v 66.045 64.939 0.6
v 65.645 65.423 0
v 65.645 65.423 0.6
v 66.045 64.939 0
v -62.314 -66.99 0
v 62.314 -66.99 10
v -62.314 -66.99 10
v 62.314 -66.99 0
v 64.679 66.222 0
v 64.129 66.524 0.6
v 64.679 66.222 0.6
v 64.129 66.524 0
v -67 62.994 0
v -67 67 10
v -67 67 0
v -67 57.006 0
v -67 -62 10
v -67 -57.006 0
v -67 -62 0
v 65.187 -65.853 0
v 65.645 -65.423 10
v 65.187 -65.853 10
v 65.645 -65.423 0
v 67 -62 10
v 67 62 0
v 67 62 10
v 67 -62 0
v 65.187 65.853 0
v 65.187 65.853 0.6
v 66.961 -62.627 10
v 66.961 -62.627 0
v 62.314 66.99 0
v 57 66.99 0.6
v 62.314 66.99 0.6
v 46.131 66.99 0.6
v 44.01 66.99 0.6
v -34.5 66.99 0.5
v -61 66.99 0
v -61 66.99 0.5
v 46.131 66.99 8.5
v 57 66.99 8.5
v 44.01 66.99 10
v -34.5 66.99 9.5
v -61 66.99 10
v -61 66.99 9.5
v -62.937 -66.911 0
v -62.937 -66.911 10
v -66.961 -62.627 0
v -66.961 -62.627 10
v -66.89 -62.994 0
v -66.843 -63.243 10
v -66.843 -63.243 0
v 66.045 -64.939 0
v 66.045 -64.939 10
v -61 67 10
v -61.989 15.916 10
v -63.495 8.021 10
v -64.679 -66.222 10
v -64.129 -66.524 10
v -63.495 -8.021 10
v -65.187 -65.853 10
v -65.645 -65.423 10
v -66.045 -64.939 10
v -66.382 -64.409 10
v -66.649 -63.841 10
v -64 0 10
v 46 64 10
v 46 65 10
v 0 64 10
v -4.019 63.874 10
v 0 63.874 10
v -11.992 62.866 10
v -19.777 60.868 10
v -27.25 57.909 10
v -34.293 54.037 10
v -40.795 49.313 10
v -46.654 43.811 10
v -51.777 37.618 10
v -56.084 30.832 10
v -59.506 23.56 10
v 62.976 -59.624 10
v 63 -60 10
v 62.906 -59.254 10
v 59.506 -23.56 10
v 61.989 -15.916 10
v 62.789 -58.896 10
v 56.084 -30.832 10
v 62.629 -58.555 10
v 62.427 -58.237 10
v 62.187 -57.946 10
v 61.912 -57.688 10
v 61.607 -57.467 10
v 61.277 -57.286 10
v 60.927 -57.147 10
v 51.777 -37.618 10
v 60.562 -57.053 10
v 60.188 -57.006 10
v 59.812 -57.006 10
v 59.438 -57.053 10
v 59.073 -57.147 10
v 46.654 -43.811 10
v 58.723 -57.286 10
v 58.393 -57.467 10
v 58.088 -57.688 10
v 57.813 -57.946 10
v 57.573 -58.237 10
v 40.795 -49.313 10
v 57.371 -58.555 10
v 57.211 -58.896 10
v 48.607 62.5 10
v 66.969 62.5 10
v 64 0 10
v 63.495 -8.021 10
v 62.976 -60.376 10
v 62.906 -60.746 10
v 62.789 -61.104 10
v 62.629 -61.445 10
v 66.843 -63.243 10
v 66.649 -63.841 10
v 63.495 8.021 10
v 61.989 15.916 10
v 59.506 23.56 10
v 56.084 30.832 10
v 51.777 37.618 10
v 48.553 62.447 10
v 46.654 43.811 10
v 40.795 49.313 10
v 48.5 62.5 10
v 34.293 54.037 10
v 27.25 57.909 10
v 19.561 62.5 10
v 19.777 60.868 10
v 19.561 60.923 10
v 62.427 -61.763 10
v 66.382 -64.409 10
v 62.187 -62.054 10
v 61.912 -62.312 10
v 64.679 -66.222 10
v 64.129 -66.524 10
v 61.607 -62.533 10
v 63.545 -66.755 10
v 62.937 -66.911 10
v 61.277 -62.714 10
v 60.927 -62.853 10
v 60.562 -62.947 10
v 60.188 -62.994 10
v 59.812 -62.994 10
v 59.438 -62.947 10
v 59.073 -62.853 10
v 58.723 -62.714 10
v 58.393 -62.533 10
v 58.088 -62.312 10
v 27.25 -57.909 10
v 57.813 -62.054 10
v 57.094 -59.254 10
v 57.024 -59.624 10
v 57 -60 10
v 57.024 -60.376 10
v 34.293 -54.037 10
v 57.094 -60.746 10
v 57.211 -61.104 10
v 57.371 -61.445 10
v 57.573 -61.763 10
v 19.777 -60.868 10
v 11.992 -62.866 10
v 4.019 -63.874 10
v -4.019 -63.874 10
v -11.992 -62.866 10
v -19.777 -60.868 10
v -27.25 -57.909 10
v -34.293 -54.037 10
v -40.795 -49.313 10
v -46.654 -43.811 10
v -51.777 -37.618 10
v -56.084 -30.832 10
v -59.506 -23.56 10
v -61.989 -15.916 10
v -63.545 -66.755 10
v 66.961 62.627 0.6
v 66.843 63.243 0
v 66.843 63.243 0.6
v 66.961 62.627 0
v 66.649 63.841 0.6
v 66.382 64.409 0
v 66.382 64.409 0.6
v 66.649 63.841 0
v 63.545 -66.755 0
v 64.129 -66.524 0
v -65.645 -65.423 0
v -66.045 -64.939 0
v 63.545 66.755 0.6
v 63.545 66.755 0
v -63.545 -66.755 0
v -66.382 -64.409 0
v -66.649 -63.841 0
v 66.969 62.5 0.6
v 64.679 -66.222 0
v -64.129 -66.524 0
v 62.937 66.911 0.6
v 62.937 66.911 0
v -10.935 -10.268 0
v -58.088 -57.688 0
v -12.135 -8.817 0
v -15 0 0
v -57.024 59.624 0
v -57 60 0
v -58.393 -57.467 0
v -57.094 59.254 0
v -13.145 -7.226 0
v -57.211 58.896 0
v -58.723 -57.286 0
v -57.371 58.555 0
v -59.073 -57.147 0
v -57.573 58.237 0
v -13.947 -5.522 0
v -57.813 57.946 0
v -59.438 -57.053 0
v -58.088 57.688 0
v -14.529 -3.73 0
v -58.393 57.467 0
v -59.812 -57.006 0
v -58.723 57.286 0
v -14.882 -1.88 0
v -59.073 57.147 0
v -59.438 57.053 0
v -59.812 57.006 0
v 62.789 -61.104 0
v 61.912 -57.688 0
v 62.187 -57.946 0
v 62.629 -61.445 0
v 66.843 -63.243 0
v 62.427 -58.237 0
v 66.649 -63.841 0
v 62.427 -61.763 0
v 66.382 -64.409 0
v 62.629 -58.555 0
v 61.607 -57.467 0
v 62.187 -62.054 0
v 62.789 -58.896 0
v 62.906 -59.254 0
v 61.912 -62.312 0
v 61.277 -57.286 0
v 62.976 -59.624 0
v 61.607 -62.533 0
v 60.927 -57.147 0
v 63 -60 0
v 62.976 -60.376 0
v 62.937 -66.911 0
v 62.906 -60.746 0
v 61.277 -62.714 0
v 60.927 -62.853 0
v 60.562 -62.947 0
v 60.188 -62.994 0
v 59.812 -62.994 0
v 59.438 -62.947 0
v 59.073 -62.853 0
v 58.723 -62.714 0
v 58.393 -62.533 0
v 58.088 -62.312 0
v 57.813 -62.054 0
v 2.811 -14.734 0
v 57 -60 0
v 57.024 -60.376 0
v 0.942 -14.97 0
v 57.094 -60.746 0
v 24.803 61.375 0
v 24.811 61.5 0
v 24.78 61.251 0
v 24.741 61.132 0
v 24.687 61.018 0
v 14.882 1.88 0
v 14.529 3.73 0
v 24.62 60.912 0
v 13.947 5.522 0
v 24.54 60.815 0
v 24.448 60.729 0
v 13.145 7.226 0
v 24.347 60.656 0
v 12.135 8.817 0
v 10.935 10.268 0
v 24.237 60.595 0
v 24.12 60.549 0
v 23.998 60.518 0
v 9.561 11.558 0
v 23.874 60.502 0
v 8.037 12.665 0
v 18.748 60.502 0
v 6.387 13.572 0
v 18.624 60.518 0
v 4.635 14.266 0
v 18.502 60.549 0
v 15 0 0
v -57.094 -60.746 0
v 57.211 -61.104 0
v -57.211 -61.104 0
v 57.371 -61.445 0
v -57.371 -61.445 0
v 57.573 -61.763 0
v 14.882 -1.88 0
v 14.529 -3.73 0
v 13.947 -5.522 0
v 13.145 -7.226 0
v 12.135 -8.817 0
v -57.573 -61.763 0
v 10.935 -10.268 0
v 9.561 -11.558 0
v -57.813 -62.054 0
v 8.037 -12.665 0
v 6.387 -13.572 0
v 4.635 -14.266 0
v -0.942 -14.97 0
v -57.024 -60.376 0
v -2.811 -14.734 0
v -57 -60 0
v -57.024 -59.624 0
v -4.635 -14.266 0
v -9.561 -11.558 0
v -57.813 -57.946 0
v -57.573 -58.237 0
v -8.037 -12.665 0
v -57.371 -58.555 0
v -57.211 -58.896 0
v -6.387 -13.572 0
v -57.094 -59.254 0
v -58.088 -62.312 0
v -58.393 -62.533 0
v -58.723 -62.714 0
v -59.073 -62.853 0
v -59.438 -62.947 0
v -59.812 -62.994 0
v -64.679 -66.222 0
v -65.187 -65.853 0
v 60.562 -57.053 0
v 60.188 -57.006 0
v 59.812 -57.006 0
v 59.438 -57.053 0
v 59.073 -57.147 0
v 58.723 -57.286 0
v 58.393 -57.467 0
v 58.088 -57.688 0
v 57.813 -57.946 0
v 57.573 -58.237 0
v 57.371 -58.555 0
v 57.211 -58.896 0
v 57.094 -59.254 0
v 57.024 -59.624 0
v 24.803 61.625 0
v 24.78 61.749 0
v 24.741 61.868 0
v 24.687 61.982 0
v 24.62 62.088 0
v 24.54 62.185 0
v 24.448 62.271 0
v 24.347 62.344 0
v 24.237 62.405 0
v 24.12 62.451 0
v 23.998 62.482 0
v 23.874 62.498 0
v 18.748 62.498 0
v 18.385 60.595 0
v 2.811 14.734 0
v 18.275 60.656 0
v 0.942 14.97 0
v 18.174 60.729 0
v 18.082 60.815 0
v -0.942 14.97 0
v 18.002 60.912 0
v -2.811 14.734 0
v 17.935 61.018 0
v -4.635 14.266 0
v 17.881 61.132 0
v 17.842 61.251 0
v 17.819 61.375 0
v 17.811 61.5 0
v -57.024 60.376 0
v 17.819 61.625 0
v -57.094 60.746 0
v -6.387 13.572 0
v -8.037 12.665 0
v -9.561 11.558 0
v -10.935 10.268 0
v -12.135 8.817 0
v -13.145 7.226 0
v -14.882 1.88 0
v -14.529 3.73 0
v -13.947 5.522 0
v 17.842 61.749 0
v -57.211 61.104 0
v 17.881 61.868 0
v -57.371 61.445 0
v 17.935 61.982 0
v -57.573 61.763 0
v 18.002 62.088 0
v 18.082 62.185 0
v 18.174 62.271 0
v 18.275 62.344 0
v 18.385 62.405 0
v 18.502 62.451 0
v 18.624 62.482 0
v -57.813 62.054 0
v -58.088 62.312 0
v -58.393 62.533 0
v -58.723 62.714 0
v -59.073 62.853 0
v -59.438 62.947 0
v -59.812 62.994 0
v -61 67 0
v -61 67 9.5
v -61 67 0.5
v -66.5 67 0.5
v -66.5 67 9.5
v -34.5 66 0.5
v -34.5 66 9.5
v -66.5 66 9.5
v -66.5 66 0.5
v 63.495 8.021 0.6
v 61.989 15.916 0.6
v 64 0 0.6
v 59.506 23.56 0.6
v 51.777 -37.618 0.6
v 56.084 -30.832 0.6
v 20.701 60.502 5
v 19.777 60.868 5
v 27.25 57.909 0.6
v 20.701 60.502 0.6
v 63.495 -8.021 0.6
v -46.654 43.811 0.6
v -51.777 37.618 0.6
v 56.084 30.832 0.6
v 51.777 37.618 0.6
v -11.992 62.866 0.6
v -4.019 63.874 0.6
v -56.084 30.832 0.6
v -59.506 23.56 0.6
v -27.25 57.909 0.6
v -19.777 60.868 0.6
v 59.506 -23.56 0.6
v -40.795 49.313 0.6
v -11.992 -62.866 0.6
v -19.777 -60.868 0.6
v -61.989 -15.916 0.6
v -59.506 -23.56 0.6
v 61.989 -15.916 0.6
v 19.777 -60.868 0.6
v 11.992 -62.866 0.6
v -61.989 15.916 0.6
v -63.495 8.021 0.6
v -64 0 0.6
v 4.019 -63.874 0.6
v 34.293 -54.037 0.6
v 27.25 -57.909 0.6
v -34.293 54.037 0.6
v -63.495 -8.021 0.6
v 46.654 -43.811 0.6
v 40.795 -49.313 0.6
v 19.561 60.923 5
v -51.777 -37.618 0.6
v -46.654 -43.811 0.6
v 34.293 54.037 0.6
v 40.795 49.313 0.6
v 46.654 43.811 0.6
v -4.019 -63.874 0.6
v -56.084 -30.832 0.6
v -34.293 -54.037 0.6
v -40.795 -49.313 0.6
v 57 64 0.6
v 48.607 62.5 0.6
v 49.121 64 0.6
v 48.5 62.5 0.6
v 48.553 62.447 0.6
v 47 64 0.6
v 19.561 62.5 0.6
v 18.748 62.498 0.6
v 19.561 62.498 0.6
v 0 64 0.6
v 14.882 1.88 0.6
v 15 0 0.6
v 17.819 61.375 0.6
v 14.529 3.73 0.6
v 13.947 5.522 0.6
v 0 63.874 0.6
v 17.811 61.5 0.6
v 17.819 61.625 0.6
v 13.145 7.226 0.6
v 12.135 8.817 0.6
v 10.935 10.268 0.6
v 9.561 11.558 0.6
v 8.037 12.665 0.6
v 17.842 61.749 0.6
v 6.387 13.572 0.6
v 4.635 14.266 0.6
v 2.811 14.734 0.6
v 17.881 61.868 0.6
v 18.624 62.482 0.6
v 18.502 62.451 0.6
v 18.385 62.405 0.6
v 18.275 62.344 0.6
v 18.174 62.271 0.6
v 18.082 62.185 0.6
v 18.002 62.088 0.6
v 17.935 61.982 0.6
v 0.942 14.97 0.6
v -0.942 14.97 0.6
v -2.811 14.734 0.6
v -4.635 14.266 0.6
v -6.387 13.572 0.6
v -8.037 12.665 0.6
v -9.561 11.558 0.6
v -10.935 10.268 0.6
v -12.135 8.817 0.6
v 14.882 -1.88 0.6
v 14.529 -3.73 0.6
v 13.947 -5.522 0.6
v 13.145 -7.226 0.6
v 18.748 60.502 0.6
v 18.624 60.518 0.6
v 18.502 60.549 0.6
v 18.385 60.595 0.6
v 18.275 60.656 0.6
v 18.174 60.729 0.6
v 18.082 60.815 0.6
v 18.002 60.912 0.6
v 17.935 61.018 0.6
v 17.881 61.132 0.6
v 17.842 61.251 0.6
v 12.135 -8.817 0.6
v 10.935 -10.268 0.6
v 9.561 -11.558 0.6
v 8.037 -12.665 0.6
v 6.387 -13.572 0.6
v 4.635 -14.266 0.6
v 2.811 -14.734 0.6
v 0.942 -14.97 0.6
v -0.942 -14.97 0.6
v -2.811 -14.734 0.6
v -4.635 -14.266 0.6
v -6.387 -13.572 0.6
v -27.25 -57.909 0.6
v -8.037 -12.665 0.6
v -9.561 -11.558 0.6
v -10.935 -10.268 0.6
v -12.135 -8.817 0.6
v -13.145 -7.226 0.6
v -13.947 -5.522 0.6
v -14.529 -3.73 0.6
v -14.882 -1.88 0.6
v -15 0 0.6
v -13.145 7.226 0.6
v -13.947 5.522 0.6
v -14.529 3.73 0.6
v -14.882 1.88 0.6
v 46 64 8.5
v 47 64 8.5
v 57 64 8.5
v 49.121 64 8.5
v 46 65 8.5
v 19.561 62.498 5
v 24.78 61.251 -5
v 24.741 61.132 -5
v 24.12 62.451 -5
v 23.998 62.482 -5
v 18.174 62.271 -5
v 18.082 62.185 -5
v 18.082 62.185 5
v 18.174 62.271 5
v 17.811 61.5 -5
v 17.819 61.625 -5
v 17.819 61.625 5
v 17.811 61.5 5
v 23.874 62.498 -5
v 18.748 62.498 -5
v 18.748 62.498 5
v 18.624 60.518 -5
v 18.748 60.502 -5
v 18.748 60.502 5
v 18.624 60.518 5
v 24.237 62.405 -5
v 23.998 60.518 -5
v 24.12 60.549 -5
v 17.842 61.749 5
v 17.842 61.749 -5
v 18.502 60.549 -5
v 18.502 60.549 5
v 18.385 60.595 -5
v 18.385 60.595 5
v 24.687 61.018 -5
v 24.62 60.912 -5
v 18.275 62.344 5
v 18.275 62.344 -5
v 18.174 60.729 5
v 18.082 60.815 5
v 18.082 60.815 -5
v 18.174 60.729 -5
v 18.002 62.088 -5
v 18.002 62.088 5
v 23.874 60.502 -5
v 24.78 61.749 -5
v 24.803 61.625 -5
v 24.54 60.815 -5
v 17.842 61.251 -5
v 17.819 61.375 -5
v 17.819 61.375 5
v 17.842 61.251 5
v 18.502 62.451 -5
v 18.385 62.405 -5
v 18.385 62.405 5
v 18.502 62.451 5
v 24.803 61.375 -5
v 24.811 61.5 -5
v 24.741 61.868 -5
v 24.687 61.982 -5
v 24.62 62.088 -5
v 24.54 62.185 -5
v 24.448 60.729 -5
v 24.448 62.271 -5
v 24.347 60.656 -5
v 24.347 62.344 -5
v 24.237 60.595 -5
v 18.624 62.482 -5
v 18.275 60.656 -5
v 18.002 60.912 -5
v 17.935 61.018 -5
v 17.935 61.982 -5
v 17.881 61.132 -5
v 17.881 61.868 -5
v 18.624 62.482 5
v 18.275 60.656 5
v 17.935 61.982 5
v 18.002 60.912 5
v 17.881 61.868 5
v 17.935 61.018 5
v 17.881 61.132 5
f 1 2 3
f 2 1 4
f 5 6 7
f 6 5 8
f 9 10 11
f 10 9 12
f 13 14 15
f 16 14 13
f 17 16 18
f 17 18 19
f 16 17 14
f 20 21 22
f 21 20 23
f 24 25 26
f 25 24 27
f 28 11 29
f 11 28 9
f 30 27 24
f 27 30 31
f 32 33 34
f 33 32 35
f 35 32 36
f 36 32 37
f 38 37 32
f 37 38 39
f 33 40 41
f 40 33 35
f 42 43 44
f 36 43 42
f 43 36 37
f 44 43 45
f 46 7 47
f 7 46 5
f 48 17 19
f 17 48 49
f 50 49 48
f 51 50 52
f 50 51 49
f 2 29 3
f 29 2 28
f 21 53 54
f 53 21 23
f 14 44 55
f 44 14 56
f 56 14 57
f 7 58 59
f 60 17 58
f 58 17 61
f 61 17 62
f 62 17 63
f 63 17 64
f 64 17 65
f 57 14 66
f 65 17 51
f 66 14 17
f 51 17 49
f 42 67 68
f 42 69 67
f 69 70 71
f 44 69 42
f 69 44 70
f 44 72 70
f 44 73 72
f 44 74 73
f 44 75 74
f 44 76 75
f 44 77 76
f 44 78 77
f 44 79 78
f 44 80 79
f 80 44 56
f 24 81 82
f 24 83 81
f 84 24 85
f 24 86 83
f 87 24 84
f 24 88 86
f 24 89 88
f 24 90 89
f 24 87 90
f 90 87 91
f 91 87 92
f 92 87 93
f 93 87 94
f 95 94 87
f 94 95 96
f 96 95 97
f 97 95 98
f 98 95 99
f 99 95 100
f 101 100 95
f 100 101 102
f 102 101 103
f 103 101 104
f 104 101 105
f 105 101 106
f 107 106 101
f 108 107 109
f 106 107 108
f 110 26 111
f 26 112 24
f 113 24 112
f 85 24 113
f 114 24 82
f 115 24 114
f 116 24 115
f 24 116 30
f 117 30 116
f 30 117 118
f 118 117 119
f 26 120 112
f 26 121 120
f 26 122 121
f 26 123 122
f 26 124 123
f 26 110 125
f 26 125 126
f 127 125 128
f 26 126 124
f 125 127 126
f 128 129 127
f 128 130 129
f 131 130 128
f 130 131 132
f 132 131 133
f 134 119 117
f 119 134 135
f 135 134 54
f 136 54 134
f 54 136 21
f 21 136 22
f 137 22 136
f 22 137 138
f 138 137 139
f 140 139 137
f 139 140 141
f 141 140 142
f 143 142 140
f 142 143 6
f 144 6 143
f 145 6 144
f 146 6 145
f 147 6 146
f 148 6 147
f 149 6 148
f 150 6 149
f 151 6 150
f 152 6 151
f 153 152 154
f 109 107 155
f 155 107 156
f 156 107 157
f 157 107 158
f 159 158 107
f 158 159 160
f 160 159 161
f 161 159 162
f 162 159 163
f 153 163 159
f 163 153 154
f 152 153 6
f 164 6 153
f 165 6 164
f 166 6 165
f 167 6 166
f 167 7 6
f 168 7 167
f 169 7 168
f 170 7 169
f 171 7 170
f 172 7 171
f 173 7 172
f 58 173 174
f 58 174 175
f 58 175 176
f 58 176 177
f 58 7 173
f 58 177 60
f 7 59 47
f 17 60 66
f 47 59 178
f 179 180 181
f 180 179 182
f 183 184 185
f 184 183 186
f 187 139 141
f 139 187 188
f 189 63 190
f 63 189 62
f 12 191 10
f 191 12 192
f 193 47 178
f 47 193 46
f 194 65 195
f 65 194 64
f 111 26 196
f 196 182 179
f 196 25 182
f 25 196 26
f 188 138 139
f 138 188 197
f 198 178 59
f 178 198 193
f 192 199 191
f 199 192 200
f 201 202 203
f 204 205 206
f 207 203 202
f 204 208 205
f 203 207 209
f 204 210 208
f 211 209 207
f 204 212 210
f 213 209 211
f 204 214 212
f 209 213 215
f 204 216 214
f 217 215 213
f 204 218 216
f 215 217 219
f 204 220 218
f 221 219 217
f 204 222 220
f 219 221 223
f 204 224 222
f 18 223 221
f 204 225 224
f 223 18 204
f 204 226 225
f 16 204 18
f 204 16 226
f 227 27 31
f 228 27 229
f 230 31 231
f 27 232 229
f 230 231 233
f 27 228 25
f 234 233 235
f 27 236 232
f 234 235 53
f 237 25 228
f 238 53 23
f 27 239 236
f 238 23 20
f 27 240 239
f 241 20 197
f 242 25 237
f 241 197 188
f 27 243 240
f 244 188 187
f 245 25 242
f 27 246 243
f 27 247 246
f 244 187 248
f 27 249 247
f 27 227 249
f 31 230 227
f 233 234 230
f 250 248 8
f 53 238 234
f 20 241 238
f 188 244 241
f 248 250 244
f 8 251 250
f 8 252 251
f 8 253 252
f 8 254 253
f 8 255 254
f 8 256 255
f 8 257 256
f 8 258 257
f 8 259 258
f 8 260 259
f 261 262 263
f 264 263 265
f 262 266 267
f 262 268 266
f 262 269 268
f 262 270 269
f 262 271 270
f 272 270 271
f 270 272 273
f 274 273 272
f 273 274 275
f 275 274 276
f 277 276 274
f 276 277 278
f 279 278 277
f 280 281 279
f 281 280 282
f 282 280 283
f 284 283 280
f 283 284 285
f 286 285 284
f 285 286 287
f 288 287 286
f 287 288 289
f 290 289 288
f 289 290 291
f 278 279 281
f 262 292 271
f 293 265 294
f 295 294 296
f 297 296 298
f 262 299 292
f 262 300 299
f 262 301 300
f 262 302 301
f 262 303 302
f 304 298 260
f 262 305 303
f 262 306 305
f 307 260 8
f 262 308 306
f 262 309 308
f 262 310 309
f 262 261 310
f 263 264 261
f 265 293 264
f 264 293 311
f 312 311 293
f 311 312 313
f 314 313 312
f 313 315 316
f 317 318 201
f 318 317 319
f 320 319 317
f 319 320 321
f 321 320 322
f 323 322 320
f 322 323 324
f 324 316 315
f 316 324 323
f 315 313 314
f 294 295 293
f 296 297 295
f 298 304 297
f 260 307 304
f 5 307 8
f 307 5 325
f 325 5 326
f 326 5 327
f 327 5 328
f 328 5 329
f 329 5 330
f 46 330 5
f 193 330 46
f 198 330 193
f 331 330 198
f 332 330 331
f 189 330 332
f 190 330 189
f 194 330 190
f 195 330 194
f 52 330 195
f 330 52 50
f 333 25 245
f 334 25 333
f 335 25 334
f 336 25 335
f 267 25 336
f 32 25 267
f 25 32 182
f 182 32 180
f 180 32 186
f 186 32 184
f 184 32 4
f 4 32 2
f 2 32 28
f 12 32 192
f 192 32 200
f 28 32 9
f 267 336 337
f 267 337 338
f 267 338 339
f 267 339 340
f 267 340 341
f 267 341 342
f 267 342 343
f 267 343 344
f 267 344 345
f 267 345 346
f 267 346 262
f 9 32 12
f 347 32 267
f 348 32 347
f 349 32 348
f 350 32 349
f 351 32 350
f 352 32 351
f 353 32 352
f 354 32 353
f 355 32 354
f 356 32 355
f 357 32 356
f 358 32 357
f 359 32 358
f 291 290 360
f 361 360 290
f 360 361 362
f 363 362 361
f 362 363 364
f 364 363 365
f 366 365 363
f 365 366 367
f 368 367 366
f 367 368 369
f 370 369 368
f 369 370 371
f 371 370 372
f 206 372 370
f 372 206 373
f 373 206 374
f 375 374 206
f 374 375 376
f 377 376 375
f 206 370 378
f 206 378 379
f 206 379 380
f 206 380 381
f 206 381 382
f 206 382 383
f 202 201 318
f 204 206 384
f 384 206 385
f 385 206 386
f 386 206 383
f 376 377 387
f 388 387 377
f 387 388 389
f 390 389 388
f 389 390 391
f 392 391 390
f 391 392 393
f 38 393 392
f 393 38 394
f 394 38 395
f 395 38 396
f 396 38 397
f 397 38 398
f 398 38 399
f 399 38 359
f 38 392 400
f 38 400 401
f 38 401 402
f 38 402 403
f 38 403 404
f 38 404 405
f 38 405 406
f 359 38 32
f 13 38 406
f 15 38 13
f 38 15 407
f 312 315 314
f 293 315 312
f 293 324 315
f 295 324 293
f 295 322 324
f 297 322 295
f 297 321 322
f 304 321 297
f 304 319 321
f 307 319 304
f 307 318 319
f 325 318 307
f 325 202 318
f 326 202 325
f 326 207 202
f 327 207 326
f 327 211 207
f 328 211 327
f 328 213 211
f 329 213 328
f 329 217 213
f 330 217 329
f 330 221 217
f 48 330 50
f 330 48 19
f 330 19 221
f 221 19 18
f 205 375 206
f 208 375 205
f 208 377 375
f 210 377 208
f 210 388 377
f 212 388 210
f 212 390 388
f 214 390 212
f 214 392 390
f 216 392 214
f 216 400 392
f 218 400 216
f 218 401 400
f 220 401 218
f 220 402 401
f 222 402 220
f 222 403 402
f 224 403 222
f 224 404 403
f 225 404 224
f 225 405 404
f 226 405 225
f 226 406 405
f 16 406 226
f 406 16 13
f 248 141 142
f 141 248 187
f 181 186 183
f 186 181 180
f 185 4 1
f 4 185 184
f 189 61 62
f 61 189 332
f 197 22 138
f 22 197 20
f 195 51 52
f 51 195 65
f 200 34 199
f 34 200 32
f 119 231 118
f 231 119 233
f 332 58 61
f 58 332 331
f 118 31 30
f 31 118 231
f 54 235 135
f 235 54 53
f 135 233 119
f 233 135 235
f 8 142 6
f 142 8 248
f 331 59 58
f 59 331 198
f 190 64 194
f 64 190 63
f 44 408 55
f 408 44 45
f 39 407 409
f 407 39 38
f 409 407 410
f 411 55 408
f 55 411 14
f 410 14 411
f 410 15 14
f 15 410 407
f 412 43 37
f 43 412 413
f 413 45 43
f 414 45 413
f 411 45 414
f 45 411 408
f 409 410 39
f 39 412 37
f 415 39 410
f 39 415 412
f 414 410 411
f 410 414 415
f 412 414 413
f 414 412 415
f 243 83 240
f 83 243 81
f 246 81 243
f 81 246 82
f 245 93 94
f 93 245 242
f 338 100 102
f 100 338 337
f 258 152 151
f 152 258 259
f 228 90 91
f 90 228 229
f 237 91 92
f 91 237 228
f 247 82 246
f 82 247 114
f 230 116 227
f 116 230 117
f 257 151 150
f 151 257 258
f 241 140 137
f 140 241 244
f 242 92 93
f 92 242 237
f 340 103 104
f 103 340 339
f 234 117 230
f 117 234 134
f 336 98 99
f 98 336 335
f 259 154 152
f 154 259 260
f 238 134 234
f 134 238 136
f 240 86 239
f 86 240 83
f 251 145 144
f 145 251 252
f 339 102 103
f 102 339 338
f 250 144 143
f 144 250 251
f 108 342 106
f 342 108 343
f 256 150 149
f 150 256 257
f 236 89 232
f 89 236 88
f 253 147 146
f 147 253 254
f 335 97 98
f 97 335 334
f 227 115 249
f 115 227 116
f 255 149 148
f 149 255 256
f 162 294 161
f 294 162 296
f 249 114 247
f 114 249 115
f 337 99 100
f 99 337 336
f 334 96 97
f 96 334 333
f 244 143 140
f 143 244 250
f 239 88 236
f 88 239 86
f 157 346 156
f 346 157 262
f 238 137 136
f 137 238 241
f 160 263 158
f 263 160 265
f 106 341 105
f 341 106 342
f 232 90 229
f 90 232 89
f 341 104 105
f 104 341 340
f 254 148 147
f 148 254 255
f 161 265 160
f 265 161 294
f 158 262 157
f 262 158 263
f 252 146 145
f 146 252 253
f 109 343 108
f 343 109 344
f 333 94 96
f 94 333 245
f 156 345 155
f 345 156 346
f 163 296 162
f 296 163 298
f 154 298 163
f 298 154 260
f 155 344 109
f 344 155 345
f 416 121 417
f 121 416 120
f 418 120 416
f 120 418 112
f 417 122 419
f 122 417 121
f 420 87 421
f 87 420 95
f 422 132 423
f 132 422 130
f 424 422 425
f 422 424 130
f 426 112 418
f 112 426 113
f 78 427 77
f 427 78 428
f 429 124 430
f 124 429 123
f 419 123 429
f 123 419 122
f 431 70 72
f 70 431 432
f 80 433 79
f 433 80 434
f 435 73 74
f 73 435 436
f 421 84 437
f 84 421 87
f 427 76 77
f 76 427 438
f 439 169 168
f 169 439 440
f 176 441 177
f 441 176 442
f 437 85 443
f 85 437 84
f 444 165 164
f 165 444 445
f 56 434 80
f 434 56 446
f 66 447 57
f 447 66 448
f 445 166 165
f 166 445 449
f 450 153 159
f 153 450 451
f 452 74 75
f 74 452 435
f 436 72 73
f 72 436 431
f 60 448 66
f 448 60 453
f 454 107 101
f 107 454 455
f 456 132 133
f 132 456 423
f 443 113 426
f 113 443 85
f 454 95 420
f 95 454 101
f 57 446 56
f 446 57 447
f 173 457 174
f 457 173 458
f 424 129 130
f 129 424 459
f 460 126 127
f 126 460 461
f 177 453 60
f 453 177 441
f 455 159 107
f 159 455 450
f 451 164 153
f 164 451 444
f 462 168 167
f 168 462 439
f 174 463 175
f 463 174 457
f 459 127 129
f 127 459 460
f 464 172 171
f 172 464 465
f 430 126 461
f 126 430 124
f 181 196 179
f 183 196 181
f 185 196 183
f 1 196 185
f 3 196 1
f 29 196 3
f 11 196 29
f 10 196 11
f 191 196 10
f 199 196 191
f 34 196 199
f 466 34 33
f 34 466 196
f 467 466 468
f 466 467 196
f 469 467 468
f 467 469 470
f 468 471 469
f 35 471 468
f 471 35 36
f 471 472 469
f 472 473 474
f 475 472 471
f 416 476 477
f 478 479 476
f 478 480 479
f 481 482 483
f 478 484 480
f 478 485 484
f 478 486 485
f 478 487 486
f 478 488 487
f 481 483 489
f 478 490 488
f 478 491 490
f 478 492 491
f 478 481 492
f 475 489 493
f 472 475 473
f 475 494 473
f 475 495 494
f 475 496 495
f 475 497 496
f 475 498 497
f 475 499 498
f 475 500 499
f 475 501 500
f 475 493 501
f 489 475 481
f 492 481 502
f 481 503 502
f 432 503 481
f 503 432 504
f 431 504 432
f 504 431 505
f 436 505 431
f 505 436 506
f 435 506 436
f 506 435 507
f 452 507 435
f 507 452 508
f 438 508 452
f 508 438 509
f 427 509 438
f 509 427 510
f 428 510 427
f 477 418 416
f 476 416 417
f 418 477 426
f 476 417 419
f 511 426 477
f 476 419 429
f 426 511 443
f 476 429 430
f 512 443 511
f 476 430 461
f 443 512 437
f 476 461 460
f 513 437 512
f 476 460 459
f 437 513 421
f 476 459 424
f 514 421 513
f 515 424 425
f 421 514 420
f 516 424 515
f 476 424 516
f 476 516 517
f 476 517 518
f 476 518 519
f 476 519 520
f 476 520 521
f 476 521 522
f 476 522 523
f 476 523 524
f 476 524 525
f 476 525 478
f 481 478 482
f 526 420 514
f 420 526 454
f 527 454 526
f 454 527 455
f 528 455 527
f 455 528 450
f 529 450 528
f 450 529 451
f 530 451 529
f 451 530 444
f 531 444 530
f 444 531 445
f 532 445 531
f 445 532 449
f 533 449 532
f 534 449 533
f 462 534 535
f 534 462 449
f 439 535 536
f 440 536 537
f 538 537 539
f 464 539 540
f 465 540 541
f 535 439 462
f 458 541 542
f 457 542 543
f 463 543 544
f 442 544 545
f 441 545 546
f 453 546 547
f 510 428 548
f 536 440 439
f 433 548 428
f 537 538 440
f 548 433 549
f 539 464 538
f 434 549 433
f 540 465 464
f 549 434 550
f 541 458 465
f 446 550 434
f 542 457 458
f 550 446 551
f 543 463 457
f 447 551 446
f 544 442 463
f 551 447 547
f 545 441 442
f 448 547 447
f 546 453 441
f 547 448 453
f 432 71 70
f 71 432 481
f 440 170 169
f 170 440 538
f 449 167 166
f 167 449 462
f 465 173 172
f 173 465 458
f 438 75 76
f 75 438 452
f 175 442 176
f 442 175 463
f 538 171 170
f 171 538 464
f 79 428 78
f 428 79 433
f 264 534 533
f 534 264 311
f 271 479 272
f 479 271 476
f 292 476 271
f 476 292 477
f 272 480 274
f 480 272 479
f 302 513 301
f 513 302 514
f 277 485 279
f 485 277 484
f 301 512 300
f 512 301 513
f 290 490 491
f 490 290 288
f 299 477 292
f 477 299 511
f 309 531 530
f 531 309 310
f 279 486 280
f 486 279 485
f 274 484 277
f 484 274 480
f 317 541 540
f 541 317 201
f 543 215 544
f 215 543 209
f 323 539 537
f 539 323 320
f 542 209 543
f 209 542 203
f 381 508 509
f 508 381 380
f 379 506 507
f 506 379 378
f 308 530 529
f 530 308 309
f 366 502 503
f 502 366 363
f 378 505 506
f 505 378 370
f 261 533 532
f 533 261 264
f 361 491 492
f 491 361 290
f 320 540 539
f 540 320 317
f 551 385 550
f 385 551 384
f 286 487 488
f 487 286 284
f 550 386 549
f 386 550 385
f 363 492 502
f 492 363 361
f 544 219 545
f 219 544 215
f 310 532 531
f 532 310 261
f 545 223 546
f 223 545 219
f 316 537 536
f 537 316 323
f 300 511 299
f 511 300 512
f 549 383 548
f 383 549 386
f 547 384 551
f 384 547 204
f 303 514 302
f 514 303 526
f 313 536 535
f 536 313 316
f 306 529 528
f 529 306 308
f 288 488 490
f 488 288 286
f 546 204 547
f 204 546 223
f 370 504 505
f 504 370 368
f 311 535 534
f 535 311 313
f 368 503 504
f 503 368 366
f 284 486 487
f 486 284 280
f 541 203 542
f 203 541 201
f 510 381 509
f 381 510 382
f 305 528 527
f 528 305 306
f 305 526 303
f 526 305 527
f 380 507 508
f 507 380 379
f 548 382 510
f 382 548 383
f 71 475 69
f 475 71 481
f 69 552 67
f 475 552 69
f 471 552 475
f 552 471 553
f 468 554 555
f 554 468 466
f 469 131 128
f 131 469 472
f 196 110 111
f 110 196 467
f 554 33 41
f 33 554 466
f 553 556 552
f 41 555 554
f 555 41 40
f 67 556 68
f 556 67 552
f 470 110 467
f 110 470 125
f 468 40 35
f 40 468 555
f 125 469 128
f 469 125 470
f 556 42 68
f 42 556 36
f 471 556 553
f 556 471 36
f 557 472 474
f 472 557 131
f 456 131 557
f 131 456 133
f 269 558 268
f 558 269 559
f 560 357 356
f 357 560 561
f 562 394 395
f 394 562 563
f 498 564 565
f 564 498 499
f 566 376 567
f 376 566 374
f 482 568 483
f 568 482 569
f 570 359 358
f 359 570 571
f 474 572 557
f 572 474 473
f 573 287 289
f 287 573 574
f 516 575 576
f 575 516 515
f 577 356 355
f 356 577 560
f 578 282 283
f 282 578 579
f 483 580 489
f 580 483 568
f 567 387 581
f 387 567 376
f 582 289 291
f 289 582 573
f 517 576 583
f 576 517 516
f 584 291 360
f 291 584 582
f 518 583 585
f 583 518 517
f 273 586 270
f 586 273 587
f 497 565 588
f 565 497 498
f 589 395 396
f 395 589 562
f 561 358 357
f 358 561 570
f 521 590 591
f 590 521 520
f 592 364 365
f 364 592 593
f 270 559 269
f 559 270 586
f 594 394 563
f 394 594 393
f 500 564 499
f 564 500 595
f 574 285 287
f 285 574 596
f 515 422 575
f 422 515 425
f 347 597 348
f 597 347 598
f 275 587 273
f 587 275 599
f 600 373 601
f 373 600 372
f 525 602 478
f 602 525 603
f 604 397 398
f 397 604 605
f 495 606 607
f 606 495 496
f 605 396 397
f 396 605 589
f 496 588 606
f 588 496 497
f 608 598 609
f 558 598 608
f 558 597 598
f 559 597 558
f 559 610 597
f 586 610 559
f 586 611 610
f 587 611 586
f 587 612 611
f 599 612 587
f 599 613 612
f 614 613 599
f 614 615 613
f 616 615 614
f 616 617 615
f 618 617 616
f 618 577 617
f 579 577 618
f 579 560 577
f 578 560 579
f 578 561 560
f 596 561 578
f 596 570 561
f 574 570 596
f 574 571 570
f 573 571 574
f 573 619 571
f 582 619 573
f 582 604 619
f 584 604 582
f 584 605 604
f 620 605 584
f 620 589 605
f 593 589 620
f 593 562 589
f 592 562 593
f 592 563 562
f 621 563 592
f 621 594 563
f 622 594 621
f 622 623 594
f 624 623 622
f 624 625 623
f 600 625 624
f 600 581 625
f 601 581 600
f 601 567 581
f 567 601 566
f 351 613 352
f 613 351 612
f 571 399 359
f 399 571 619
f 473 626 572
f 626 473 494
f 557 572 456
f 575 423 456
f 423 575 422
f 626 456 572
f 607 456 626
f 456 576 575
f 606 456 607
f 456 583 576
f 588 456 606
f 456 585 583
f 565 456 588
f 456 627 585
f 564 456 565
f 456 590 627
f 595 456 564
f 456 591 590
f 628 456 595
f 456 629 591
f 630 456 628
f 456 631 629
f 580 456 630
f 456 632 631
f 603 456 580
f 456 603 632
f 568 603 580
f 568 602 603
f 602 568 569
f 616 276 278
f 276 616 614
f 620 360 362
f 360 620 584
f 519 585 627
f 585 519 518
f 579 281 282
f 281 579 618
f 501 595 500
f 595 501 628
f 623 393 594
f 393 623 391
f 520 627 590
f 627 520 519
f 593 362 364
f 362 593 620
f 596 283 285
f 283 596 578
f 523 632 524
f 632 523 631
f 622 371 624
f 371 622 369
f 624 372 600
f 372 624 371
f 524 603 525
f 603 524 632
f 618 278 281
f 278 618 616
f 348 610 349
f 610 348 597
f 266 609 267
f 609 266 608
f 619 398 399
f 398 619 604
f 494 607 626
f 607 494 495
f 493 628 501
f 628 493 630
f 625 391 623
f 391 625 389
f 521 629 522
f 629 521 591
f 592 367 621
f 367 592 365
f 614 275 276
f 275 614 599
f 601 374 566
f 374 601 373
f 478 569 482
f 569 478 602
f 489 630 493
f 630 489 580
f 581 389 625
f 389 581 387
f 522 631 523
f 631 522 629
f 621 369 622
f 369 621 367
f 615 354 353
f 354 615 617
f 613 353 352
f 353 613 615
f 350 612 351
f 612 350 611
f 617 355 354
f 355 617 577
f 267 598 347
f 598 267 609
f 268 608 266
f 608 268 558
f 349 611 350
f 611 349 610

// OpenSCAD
$fn = 50;


union() {
	difference() {
		union() {
			hull() {
				translate(v = [-62.0000000000, 62.0000000000, 0]) {
					cylinder(h = 10, r = 5);
				}
				translate(v = [62.0000000000, 62.0000000000, 0]) {
					cylinder(h = 10, r = 5);
				}
				translate(v = [-62.0000000000, -62.0000000000, 0]) {
					cylinder(h = 10, r = 5);
				}
				translate(v = [62.0000000000, -62.0000000000, 0]) {
					cylinder(h = 10, r = 5);
				}
			}
			translate(v = [-67.0000000000, 61.0000000000, 0]) {
				cube(size = [6, 6, 10]);
			}
		}
		union() {
			translate(v = [-67.5000000000, -60.0000000000, -250.0000000000]) {
				rotate(a = [0, 0, 0]) {
					difference() {
						union() {
							hull() {
								translate(v = [7.5000000000, 0, 0]) {
									cylinder(h = 250, r = 3.0000000000, r1 = 3.0000000000, r2 = 3.0000000000);
								}
								translate(v = [-7.5000000000, 0, 0]) {
									cylinder(h = 250, r = 3.0000000000, r1 = 3.0000000000, r2 = 3.0000000000);
								}
							}
						}
						union();
					}
				}
			}
			translate(v = [-67.5000000000, 60.0000000000, -250.0000000000]) {
				rotate(a = [0, 0, 0]) {
					difference() {
						union() {
							hull() {
								translate(v = [7.5000000000, 0, 0]) {
									cylinder(h = 250, r = 3.0000000000, r1 = 3.0000000000, r2 = 3.0000000000);
								}
								translate(v = [-7.5000000000, 0, 0]) {
									cylinder(h = 250, r = 3.0000000000, r1 = 3.0000000000, r2 = 3.0000000000);
								}
							}
						}
						union();
					}
				}
			}
			translate(v = [-66.5000000000, 66.0000000000, 0.5000000000]) {
				cube(size = [32, 1, 9.0000000000]);
			}
			translate(v = [60.0000000000, -60.0000000000, 0]) {
				cylinder(h = 100, r = 3.0000000000);
			}
			translate(v = [0, 0, 0.6000000000]) {
				cylinder(h = 12.4000000000, r = 64.0000000000);
			}
			translate(v = [0, 0, -5.0000000000]) {
				cylinder(h = 10, r = 15.0000000000);
			}
			translate(v = [0.0000000000, 62.5000000000, 0.6000000000]) {
				cube(size = [67.0000000000, 1.5000000000, 12.4000000000]);
			}
			translate(v = [57.0000000000, 62.5000000000, 0.6000000000]) {
				cube(size = [10, 4.5000000000, 12.4000000000]);
			}
			translate(v = [46.0000000000, 62.5000000000, 8.5000000000]) {
				cube(size = [21, 4.5000000000, 1.5000000000]);
			}
			translate(v = [43.2500000000, 67.7500000000, 0.6000000000]) {
				rotate(a = [0, 0, -45]) {
					cube(size = [7.5000000000, 1.5000000000, 12.4000000000]);
				}
			}
			translate(v = [12.0610000000, 60.5000000000, 0.6000000000]) {
				cube(size = [7.5000000000, 2, 9.4000000000]);
			}
		}
	}
	union() {
		translate(v = [21.3110000000, 61.5000000000, -5.0000000000]) {
			rotate(a = [0, 0, 0]) {
				difference() {
					union() {
						#hull() {
							#translate(v = [2.5000000000, 0, 0]) {
								cylinder(h = 10, r = 1.0000000000, r1 = 1.0000000000, r2 = 1.0000000000);
							}
							#translate(v = [-2.5000000000, 0, 0]) {
								cylinder(h = 10, r = 1.0000000000, r1 = 1.0000000000, r2 = 1.0000000000);
							}
						}
					}
					union();
				}
			}
		}
	}
}
